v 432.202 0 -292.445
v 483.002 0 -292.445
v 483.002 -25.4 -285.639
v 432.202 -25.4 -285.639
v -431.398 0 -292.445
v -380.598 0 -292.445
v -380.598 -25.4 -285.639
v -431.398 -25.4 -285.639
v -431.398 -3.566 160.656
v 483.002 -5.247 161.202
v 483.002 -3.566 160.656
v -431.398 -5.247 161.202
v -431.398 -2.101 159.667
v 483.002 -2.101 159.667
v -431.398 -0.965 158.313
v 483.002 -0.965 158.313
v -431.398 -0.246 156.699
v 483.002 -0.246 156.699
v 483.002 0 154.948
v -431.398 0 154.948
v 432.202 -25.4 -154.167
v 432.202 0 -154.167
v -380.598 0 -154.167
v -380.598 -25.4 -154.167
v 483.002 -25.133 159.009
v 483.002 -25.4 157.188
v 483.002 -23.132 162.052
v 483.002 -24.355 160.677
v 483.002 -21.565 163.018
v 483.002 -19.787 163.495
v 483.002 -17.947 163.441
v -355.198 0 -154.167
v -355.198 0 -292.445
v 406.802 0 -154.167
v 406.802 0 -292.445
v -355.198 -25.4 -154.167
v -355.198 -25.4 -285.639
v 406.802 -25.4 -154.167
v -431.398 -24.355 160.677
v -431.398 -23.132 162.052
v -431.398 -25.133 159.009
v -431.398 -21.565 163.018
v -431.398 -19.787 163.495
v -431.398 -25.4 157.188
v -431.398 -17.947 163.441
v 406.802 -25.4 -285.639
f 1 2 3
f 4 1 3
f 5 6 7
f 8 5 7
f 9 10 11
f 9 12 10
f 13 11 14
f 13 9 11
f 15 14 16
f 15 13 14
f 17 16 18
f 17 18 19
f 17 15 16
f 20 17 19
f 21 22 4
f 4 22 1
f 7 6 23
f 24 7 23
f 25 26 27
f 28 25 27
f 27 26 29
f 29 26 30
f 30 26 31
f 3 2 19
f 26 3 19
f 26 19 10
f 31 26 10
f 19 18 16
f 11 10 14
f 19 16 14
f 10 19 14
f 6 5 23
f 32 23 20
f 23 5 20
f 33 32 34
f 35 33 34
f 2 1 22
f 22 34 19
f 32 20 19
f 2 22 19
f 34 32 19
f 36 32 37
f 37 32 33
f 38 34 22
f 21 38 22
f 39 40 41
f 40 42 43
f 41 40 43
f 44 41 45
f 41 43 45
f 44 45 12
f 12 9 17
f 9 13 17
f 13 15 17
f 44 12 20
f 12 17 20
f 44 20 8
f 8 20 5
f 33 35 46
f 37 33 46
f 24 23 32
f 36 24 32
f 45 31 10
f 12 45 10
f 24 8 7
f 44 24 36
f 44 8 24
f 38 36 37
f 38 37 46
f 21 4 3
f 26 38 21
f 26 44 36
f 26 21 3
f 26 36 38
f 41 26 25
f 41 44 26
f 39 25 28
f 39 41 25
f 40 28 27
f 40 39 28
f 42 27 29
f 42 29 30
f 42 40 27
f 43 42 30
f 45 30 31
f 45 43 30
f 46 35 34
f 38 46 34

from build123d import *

# Parameters (mm, degrees)
F1_DEPTH = 25.4
F3_DEPTH = 914.4
F4_R     = 6.35
F6_DEPTH = 914.401


with BuildPart() as f1:
    # F0 (on Front) → F1 (new body)
    with BuildSketch(Plane.XZ):
        Polygon((483.0016511798, 164.7552716235), (-431.3983488202, 164.7552716235), (-431.3983488202, -292.4447283765), (-380.5983488202, -292.4447283765), (-380.5983488202, -154.1671283765), (-355.1983488202, -154.1671283765), (-355.1983488202, -292.4447283765), (406.8016511798, -292.4447283765), (406.8016511798, -154.1671283765), (432.2016511798, -154.1671283765), (432.2016511798, -292.4447283765), (483.0016511798, -292.4447283765), align=None)
    extrude(amount=F1_DEPTH)

    # F2 (on face) → F3 (cut)
    with BuildSketch(Plane.YZ.offset(483.0016511798)):
        Polygon((0, 164.7552716235), (-25.4, 164.7552716235), (0, 160.2765663135), align=None)
    extrude(amount=-F3_DEPTH, mode=Mode.SUBTRACT)

    # F4
    f4_edges = [f1.edges().sort_by_distance(p)[0] for p in [
        (25.801651, 0, 160.276566),
        (25.801651, -25.4, 164.755272),
    ]]
    fillet(f4_edges, radius=F4_R)

    # F5 (on face) → F6 (cut, through all)
    with BuildSketch(Plane.YZ.offset(483.0016511798)):
        Polygon((-25.4, -292.4447283765), (0, -292.4447283765), (-25.4, -285.6388188887), align=None)
    extrude(amount=-F6_DEPTH, mode=Mode.SUBTRACT)


solid = f1.part
